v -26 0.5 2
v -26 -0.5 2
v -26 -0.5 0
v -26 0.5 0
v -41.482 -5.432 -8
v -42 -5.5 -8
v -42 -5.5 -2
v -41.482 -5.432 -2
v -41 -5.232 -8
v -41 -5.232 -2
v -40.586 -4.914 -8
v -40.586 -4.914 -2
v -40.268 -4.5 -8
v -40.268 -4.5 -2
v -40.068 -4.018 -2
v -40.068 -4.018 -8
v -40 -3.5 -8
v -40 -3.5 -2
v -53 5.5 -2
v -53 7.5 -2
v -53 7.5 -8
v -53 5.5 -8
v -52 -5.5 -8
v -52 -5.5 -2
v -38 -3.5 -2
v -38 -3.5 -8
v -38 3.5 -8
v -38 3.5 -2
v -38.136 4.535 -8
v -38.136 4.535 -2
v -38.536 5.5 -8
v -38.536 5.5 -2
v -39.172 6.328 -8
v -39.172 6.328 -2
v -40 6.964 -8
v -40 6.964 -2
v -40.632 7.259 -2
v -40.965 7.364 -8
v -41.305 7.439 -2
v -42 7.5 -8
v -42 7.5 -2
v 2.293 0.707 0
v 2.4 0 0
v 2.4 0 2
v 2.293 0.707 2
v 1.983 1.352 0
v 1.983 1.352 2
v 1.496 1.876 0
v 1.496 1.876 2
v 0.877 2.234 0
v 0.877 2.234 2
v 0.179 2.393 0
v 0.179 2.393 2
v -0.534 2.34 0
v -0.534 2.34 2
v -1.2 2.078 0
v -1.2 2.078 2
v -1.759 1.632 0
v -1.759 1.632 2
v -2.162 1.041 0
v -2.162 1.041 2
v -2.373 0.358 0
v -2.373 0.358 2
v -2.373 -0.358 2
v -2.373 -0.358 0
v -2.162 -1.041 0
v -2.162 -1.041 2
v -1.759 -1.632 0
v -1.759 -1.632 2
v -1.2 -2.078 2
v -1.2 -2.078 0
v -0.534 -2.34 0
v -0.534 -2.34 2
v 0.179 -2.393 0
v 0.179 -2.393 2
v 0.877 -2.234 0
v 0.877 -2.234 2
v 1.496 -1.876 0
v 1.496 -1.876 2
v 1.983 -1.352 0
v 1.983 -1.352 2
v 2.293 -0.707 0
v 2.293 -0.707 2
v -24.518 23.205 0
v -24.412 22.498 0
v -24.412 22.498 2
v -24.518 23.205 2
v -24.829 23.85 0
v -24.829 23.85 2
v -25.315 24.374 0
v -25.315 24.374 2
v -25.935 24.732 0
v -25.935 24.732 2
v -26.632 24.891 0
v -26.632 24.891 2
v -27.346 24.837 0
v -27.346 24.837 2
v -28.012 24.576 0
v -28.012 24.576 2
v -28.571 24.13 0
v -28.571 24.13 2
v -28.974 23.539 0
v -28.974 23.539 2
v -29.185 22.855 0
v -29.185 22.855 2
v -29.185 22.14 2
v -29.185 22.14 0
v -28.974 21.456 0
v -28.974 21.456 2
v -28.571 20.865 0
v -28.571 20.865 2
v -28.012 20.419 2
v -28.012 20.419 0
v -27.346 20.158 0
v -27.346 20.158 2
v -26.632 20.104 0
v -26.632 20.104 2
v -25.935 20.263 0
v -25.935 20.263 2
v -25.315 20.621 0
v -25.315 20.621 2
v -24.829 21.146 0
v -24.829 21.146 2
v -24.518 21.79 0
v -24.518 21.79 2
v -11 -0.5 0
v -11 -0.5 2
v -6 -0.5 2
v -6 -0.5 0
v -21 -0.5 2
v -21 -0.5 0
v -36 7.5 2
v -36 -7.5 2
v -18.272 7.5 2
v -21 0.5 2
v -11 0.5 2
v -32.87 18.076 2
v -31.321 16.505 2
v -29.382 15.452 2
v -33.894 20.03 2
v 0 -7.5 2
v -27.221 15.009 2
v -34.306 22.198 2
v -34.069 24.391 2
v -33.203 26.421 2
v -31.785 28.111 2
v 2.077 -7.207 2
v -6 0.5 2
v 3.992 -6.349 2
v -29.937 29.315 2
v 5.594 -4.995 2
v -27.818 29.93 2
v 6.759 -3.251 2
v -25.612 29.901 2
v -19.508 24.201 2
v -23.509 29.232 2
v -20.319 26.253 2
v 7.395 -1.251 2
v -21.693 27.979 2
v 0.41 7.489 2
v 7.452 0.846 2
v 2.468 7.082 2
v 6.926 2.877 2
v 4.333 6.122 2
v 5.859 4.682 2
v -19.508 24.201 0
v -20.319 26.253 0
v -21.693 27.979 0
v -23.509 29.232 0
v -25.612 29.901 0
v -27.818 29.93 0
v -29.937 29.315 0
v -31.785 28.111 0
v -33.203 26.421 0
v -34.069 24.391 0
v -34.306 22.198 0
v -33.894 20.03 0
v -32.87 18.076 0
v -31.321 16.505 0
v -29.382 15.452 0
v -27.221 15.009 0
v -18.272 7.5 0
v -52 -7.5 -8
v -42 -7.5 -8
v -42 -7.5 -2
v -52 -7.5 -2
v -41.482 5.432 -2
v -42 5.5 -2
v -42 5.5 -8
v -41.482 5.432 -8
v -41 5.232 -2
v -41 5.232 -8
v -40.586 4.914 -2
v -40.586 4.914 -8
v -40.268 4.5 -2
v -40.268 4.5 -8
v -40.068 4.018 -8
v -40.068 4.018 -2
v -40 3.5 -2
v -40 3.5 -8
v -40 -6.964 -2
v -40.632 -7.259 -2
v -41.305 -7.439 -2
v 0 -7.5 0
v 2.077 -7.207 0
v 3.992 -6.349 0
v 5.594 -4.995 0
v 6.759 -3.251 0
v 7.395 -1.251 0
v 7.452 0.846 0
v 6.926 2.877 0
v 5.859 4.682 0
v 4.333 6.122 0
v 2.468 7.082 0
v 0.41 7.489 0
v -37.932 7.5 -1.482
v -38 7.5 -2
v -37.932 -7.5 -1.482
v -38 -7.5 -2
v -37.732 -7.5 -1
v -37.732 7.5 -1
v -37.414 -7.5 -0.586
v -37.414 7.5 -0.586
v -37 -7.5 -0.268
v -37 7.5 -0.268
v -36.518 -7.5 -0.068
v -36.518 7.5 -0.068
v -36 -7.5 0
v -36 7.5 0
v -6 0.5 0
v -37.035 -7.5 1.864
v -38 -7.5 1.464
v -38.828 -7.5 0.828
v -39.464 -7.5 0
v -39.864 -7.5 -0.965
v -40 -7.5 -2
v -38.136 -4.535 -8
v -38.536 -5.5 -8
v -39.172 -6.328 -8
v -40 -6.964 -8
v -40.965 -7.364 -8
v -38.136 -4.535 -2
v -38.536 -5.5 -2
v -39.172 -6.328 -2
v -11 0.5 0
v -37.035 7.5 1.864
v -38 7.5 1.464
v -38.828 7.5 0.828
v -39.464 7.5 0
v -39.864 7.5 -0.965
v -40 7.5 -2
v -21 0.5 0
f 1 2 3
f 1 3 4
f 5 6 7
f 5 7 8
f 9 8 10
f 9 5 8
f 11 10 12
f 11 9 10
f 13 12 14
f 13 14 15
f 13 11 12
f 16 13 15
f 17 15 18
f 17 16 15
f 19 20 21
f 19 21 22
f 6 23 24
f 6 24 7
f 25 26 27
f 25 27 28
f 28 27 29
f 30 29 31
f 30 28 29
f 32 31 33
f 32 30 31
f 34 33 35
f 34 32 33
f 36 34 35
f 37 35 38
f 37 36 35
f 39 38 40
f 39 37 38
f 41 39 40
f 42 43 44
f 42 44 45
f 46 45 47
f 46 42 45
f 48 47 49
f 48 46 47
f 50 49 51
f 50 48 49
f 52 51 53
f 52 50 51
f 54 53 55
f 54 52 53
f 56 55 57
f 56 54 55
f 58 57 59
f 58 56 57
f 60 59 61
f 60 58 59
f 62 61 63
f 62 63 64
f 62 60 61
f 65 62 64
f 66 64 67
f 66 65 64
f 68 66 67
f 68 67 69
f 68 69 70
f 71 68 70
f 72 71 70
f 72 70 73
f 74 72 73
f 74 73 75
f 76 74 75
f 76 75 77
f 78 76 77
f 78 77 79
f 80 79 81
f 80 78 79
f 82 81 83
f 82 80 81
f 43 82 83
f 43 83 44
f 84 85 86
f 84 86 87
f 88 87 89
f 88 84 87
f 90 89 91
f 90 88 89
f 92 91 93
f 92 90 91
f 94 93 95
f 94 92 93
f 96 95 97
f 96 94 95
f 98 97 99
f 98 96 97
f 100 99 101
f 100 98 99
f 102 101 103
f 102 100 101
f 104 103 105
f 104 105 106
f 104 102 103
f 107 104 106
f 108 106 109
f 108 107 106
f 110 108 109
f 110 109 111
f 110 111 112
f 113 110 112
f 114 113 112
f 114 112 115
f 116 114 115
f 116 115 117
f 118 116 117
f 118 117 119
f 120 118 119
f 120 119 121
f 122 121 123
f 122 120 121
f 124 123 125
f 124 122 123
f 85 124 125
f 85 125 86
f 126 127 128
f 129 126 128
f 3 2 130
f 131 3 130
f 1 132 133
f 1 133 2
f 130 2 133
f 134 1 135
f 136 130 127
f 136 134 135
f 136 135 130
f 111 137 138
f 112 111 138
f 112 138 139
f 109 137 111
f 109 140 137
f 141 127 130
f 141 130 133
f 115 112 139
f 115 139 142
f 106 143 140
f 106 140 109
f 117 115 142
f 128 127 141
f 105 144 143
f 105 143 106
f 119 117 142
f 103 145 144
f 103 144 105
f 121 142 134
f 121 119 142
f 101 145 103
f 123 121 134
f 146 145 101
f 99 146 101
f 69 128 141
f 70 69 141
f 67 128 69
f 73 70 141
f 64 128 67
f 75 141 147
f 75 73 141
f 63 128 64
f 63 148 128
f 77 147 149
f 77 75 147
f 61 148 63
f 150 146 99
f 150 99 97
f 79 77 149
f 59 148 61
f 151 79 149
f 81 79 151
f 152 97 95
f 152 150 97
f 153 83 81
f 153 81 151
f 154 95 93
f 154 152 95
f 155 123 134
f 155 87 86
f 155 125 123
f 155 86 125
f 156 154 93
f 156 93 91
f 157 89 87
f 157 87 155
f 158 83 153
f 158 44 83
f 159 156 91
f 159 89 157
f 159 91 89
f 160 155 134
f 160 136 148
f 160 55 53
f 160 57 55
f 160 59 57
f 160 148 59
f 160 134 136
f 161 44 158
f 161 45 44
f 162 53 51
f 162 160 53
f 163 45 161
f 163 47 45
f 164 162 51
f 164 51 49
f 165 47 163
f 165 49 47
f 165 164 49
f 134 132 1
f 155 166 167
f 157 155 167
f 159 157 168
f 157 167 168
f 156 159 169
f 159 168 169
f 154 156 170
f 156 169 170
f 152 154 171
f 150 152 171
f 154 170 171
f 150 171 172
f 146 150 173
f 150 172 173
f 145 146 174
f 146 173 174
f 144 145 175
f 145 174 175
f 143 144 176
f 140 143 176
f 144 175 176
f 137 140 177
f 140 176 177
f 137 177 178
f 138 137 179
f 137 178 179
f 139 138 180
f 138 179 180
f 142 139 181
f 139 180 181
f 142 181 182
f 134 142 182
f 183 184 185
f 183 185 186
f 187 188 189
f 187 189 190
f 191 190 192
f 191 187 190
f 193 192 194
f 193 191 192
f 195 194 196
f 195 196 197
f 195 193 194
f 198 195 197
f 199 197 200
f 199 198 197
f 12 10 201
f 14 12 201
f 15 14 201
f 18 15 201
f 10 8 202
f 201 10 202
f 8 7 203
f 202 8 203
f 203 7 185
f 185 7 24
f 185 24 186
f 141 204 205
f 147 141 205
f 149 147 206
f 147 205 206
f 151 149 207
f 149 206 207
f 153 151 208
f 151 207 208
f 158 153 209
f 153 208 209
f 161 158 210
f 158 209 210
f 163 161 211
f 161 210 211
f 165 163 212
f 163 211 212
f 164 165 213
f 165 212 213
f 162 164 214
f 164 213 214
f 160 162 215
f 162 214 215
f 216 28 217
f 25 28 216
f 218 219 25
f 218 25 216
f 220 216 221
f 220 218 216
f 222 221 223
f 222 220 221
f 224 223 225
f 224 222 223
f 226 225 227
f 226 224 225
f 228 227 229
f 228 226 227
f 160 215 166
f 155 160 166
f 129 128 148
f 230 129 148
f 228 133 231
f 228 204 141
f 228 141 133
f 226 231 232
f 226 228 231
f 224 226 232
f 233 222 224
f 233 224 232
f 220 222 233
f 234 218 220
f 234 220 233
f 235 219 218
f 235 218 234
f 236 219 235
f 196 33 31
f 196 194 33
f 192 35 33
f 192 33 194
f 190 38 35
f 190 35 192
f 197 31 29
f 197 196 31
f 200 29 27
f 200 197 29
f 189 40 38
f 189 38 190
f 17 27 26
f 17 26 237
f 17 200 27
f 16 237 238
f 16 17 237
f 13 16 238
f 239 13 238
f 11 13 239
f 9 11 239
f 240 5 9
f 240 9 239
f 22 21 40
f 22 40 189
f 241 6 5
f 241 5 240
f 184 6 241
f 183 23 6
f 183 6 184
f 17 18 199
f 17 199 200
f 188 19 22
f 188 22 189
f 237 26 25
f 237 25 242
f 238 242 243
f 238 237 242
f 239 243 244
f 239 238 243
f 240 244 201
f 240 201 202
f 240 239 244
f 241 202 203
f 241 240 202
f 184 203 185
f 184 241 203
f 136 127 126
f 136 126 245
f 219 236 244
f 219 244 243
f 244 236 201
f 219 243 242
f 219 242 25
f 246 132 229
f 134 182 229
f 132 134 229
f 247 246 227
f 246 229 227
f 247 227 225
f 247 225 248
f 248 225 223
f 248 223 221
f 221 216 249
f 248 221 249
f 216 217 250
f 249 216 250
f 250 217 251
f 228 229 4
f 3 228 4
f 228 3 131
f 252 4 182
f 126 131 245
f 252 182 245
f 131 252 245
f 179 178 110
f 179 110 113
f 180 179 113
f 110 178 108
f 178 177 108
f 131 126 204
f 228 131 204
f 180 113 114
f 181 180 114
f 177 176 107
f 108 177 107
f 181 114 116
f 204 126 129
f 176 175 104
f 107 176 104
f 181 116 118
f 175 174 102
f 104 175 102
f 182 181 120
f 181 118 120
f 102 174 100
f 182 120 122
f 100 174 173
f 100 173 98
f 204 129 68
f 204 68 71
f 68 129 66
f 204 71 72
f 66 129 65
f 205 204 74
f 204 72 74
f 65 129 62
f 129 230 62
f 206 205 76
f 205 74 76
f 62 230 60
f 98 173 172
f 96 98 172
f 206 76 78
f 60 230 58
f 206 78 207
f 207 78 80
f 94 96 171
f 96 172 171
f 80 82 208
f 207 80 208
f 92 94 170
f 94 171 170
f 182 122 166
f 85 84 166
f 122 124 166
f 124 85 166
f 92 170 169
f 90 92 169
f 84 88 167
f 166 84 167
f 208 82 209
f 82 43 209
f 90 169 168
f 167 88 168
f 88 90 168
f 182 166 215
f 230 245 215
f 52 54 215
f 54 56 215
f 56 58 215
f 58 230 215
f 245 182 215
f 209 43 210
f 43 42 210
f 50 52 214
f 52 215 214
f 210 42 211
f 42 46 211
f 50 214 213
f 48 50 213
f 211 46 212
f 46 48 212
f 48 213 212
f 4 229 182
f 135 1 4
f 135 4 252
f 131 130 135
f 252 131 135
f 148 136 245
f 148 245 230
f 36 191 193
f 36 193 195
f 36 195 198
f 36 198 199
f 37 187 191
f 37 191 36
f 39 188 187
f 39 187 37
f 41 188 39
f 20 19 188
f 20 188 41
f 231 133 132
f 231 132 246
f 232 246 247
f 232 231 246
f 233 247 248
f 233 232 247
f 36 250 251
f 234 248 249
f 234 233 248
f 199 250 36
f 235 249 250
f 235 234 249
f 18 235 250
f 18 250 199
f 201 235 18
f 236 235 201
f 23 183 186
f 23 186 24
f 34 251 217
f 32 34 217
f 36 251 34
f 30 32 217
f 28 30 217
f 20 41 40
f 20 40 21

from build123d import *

# Parameters (mm, degrees)
SKETCH1_R                    = 2.4
BOSS_EXTRUDE1_DEPTH          = 2
SKETCH2_W                    = 5
SKETCH2_H                    = 1
CUT_EXTRUDE1_DEPTH           = 51.038525021
EDGE_FLANGE1_STRIP_W         = 12
EDGE_FLANGE1_STRIP_H         = 2
EDGE_FLANGE1_STRIP_CUT_DEPTH = 15
EDGE_FLANGE1_DEPTH           = 15
EDGE_FLANGE2_STRIP_W         = 12
EDGE_FLANGE2_STRIP_H         = 2
EDGE_FLANGE2_STRIP_CUT_DEPTH = 6
EDGE_FLANGE2_DEPTH           = 6
EDGE_FLANGE3_STRIP_W         = 12
EDGE_FLANGE3_STRIP_H         = 2
EDGE_FLANGE3_STRIP_CUT_DEPTH = 6
EDGE_FLANGE3_DEPTH           = 6


# Sheet-metal steps are written as plain solids
with BuildPart() as part:
    # Sketch1 → Boss-Extrude1 (new body)
    with BuildSketch(Plane.XY):
        with BuildLine():
            Line((0.409525664, 7.488810902), (-19.507629857, 24.201288754))
            ThreePointArc((-19.507629857, 24.201288754), (-32.556888833, 27.318473412), (-27.221081173, 15.008755437))
            Line((-27.221081173, 15.008755437), (-18.272494906, 7.5))
            Line((-18.272494906, 7.5), (-40, 7.5))
            Line((-40, 7.5), (-40, -7.5))
            Line((-40, -7.5), (0, -7.5))
            ThreePointArc((0, -7.5), (7.497202204, -0.204839245), (0.409525664, 7.488810902))
        make_face()
        Circle(SKETCH1_R, mode=Mode.SUBTRACT)
        with Locations((-26.811555509, 22.497566339)):
            Circle(SKETCH1_R, mode=Mode.SUBTRACT)
    extrude(amount=BOSS_EXTRUDE1_DEPTH)

    # Sketch2 → Cut-Extrude1 (cut, through all)
    with BuildSketch(Plane.XY.offset(2)):
        with Locations((-23.5, 0)):
            Rectangle(SKETCH2_W, SKETCH2_H)
        with Locations((-8.5, 0)):
            Rectangle(SKETCH2_W, SKETCH2_H)
    extrude(amount=-CUT_EXTRUDE1_DEPTH, mode=Mode.SUBTRACT)

    # Edge-Flange1 strip (across the edge) → Edge-Flange1 strip cut (cut)
    with BuildSketch(Plane(origin=(-40, -7.5, 0), x_dir=(1, 0, 0), z_dir=(0, 1, 0))):
        with Locations((-2, -1)):
            Rectangle(EDGE_FLANGE1_STRIP_W, EDGE_FLANGE1_STRIP_H)
    extrude(amount=EDGE_FLANGE1_STRIP_CUT_DEPTH, mode=Mode.SUBTRACT)

    # Edge-Flange1 section (across the edge) → Edge-Flange1 (add)
    with BuildSketch(Plane(origin=(-40, -7.5, 0), x_dir=(1, 0, 0), z_dir=(0, 1, 0))):
        with BuildLine():
            Line((0, 2), (0, 8))
            Line((0, 8), (2, 8))
            Line((2, 8), (2, 2))
            ThreePointArc((2, 2), (2.585786438, 0.585786438), (4, 0))
            Line((4, 0), (4, -2))
            ThreePointArc((4, -2), (1.171572875, -0.828427125), (0, 2))
        make_face()
    extrude(amount=EDGE_FLANGE1_DEPTH)

    # Edge-Flange2 strip (across the edge) → Edge-Flange2 strip cut (cut)
    with BuildSketch(Plane(origin=(-40, 7.5, -2), x_dir=(0, -1, 0), z_dir=(0, 0, -1))):
        with Locations((-2, -1)):
            Rectangle(EDGE_FLANGE2_STRIP_W, EDGE_FLANGE2_STRIP_H)
    extrude(amount=EDGE_FLANGE2_STRIP_CUT_DEPTH, mode=Mode.SUBTRACT)

    # Edge-Flange2 section (across the edge) → Edge-Flange2 (add)
    with BuildSketch(Plane(origin=(-40, 7.5, -2), x_dir=(0, -1, 0), z_dir=(0, 0, -1))):
        with BuildLine():
            Line((0, 2), (0, 13))
            Line((0, 13), (2, 13))
            Line((2, 13), (2, 2))
            ThreePointArc((2, 2), (2.585786438, 0.585786438), (4, 0))
            Line((4, 0), (4, -2))
            ThreePointArc((4, -2), (1.171572875, -0.828427125), (0, 2))
        make_face()
    extrude(amount=EDGE_FLANGE2_DEPTH)

    # Edge-Flange3 strip (across the edge) → Edge-Flange3 strip cut (cut)
    with BuildSketch(Plane(origin=(-40, -7.5, -8), x_dir=(0, 1, 0), z_dir=(0, 0, 1))):
        with Locations((-2, -1)):
            Rectangle(EDGE_FLANGE3_STRIP_W, EDGE_FLANGE3_STRIP_H)
    extrude(amount=EDGE_FLANGE3_STRIP_CUT_DEPTH, mode=Mode.SUBTRACT)

    # Edge-Flange3 section (across the edge) → Edge-Flange3 (add)
    with BuildSketch(Plane(origin=(-40, -7.5, -8), x_dir=(0, 1, 0), z_dir=(0, 0, 1))):
        with BuildLine():
            Line((0, 2), (0, 12))
            Line((0, 12), (2, 12))
            Line((2, 12), (2, 2))
            ThreePointArc((2, 2), (2.585786438, 0.585786438), (4, 0))
            Line((4, 0), (4, -2))
            ThreePointArc((4, -2), (1.171572875, -0.828427125), (0, 2))
        make_face()
    extrude(amount=EDGE_FLANGE3_DEPTH)


solid = part.part
